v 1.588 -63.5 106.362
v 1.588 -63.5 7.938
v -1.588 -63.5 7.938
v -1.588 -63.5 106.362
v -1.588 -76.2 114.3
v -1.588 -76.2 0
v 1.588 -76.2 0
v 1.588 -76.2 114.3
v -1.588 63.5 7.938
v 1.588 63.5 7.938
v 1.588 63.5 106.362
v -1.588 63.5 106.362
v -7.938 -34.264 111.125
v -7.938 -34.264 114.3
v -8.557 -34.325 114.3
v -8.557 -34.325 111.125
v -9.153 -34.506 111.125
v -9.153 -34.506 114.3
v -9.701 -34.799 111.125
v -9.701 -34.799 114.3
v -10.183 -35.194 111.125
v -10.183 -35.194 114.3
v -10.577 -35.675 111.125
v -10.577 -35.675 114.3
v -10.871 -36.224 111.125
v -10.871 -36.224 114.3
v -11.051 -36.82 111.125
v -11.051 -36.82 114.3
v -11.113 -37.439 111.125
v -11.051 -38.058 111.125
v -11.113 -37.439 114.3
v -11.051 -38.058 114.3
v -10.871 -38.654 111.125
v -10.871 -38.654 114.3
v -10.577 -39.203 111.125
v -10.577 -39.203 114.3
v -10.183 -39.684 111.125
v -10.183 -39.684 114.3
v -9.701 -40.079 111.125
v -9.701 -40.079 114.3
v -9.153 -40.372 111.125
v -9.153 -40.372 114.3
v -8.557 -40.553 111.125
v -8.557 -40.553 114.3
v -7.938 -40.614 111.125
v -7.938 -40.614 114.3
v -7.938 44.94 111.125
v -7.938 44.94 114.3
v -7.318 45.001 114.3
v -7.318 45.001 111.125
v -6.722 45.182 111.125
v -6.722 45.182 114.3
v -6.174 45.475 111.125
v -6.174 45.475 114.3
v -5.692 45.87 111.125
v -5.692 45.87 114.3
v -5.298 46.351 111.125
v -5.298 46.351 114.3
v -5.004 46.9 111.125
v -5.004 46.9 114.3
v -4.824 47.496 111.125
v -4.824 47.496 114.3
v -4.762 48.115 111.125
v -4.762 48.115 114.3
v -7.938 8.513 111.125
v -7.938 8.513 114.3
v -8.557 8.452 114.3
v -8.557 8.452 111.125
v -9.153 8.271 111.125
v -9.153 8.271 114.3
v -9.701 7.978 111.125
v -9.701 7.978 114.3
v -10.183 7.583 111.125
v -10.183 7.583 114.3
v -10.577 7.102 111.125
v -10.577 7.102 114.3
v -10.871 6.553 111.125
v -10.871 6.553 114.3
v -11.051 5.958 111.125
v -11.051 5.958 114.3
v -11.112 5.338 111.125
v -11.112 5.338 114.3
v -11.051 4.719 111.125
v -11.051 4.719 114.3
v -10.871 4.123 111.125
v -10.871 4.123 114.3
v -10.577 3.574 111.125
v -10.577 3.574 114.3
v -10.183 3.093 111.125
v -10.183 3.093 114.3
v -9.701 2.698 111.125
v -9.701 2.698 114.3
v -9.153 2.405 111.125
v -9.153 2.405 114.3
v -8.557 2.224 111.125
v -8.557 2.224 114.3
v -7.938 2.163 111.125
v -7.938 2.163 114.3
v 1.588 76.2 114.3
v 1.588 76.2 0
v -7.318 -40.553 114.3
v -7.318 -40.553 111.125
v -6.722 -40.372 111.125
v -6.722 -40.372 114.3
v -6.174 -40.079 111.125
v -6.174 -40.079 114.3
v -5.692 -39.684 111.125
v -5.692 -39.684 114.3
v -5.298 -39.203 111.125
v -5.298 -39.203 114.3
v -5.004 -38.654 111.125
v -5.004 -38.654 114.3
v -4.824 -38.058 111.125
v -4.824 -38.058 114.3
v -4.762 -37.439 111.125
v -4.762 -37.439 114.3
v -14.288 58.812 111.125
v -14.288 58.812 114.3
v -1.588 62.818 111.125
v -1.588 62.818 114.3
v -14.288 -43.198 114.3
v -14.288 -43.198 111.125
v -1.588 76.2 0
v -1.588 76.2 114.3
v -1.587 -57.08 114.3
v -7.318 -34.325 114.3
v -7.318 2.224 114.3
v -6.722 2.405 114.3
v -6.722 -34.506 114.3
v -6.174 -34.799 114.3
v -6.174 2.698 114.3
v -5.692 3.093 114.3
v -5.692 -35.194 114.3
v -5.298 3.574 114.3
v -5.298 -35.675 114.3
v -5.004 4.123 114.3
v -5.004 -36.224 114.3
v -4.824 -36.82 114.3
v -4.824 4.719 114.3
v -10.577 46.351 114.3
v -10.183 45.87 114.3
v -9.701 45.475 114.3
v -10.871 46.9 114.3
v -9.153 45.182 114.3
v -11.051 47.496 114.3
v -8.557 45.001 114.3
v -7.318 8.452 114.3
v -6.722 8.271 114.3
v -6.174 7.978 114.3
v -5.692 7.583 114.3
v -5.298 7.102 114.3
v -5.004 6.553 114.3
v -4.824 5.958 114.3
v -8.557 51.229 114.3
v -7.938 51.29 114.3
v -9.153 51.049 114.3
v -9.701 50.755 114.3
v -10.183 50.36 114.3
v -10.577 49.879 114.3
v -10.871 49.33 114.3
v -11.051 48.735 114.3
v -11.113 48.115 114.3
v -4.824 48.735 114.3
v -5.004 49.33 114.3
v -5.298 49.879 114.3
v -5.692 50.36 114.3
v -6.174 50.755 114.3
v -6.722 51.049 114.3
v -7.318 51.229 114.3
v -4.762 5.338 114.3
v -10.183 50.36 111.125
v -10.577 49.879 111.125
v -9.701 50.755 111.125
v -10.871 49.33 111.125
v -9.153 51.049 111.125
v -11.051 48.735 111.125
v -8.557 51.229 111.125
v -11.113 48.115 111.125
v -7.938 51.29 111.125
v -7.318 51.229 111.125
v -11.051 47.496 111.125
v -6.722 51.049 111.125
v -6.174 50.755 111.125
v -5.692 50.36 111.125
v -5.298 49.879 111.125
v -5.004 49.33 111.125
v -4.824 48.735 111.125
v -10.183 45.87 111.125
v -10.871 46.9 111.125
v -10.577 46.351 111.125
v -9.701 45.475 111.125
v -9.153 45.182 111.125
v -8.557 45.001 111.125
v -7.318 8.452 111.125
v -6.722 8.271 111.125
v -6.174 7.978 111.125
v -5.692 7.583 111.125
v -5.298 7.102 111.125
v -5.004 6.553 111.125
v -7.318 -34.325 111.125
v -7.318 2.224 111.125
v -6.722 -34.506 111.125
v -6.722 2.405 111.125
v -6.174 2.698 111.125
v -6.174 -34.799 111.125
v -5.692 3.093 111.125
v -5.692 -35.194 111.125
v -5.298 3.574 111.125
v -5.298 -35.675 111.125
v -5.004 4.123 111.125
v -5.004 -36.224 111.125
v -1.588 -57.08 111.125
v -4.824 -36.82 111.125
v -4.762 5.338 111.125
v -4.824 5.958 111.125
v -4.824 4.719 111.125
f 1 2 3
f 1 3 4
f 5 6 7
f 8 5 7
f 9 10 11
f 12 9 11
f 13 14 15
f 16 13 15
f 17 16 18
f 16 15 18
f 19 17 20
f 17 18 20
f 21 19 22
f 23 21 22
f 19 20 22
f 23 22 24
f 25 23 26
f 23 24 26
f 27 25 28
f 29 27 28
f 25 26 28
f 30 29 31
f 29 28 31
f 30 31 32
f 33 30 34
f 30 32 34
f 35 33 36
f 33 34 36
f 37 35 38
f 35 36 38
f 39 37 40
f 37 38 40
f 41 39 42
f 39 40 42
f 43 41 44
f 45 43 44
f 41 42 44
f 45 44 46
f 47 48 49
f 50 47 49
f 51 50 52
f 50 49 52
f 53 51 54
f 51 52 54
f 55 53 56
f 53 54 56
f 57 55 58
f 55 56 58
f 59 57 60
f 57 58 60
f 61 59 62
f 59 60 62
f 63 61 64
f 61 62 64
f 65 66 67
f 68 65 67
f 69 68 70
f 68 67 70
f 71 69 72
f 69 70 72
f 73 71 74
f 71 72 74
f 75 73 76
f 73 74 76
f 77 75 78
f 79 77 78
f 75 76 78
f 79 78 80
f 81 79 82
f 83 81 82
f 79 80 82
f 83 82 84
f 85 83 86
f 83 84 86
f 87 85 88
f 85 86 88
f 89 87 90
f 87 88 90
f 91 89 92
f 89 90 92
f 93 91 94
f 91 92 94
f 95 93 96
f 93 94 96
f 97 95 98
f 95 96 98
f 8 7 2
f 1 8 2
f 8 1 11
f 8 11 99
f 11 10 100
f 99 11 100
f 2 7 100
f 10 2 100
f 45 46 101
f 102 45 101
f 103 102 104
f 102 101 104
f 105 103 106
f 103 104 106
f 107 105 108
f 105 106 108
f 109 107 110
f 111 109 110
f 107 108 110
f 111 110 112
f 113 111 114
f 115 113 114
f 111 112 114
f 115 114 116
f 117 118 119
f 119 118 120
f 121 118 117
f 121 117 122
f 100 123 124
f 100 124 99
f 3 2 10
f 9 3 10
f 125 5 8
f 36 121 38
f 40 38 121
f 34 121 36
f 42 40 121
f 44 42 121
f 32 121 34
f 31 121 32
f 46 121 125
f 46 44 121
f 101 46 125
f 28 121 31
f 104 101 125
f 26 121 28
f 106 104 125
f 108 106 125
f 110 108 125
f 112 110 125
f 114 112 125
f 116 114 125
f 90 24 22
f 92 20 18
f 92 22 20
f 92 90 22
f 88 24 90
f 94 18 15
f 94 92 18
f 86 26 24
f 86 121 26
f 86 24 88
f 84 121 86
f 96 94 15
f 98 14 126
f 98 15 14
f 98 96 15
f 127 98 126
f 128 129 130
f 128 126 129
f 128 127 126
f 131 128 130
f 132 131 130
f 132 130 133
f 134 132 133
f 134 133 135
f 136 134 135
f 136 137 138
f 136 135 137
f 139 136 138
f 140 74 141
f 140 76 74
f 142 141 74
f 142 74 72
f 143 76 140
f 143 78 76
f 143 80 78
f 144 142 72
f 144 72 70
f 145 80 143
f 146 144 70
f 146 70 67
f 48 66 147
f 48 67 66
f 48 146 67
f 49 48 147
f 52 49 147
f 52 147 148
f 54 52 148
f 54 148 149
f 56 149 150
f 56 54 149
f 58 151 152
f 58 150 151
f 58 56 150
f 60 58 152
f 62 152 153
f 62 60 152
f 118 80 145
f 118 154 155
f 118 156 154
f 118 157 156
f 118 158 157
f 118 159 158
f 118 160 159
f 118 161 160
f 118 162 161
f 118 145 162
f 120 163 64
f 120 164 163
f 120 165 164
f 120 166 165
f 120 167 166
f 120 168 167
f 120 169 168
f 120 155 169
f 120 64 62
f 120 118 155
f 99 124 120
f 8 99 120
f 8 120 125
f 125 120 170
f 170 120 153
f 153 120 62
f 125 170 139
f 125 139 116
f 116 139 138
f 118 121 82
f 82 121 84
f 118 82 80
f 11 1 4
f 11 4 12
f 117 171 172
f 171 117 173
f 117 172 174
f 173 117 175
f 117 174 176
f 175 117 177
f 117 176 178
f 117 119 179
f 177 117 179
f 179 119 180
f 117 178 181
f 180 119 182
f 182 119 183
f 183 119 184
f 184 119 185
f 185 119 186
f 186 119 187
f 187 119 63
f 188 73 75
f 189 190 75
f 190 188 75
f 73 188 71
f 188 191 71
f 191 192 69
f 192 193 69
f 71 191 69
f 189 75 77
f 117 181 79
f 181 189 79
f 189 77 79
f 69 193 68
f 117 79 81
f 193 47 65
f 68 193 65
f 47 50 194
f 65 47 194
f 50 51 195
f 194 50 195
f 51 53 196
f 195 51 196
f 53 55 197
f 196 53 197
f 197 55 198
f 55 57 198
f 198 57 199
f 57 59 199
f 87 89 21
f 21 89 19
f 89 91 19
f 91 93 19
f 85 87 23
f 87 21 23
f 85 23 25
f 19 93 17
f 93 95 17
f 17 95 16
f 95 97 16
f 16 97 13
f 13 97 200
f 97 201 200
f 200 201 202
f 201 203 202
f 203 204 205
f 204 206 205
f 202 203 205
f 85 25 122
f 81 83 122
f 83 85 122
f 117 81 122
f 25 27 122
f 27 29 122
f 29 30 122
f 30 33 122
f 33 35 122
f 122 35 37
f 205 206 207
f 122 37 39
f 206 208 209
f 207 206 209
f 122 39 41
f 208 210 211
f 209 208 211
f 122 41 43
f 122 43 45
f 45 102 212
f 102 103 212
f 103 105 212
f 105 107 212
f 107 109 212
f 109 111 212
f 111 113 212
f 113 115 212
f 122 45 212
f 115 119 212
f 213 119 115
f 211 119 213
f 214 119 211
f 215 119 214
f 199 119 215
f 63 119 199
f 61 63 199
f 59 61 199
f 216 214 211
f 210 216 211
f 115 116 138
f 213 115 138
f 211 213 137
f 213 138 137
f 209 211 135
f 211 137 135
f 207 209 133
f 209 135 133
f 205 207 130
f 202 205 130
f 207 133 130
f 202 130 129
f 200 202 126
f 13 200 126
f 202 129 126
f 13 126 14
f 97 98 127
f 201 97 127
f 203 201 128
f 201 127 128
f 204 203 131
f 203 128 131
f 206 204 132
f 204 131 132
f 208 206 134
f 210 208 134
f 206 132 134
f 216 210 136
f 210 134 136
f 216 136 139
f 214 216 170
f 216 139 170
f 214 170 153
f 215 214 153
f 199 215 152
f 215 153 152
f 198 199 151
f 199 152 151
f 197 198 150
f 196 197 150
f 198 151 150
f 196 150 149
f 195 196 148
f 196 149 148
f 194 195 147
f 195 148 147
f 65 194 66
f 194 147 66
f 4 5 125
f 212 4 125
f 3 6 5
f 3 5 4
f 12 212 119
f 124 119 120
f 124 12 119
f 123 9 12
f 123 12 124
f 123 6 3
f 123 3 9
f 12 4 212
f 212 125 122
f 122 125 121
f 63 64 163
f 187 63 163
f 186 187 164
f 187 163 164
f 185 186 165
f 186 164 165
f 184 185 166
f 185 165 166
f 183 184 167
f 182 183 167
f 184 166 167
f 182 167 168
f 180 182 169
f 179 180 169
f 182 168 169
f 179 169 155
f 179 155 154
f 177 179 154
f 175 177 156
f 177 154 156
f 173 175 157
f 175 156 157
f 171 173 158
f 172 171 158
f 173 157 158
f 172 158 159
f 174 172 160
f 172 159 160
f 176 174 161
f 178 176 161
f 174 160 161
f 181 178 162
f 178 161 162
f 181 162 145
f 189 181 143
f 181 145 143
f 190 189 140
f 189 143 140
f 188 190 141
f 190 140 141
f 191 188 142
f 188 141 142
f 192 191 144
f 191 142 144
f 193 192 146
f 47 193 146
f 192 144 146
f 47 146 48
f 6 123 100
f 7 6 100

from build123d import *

# Parameters (mm, degrees)
F0_W     = 3.175
F0_H     = 152.4
F1_DEPTH = 114.3
F2_W     = 127
F2_H     = 98.425
F3_DEPTH = 25.4
F4_W     = 119.8984608054
F4_H     = 3.175
F5_DEPTH = 12.7
F7_DEPTH = 25.4
F9_DEPTH = 25.4


with BuildPart() as f1:
    # F0 (on Top) → F1 (new body)
    with BuildSketch(Plane.XY):
        Rectangle(F0_W, F0_H)
    extrude(amount=F1_DEPTH)

    # F2 (on face) → F3 (cut)
    with BuildSketch(Plane.YZ.offset(1.5875)):
        with Locations((0, 57.15)):
            Rectangle(F2_W, F2_H)
    extrude(amount=-F3_DEPTH, mode=Mode.SUBTRACT)

    # F4 (on face) → F5 (join)
    with BuildSketch(Plane(origin=(-1.5875, 0, 0), x_dir=(0, -1, 0), z_dir=(-1, 0, 0))):
        with Locations((-2.8692372143, 112.7125)):
            Rectangle(F4_W, F4_H)
    extrude(amount=F5_DEPTH)

    # F6 (on face) → F7 (cut)
    with BuildSketch(Plane.XY.offset(114.3)):
        Polygon((-14.2875, 58.8119849563), (-1.5875, 62.818467617), (-14.2875, 62.818467617), align=None)
        Polygon((-14.2875, -57.0799931884), (-1.5875, -57.0799931884), (-14.2875, -43.1980900466), align=None)
    extrude(amount=-F7_DEPTH, mode=Mode.SUBTRACT)

    # F8 (on face) → F9 (cut)
    with BuildSketch(Plane.XY.offset(114.3)):
        with BuildLine():
            ThreePointArc((-4.7625, 48.1152262866), (-5.6924359697, 50.3602903169), (-7.9375, 51.2902262866))
            Line((-7.9375, 51.2902262866), (-7.9375, 44.9402262866))
            ThreePointArc((-7.9375, 44.9402262866), (-5.6924359697, 45.8701622564), (-4.7625, 48.1152262866))
        make_face()
        with BuildLine():
            ThreePointArc((-4.7625, -37.4390416175), (-5.6924359697, -35.1939775872), (-7.9375, -34.2640416175))
            Line((-7.9375, -34.2640416175), (-7.9375, -40.6140416175))
            ThreePointArc((-7.9375, -40.6140416175), (-5.6924359697, -39.6841056478), (-4.7625, -37.4390416175))
        make_face()
        with BuildLine():
            Line((-7.9375, -40.6140416175), (-7.9375, -34.2640416175))
            ThreePointArc((-7.9375, -34.2640416175), (-11.1125, -37.4390416175), (-7.9375, -40.6140416175))
        make_face()
        with BuildLine():
            ThreePointArc((-4.7625, 5.3380923346), (-5.6924359697, 7.5831563648), (-7.9375, 8.5130923346))
            Line((-7.9375, 8.5130923346), (-7.9375, 2.1630923346))
            ThreePointArc((-7.9375, 2.1630923346), (-5.6924359697, 3.0930283043), (-4.7625, 5.3380923346))
        make_face()
        with BuildLine():
            Line((-7.9375, 2.1630923346), (-7.9375, 8.5130923346))
            ThreePointArc((-7.9375, 8.5130923346), (-11.1125, 5.3380923346), (-7.9375, 2.1630923346))
        make_face()
        with BuildLine():
            Line((-7.9375, 44.9402262866), (-7.9375, 51.2902262866))
            ThreePointArc((-7.9375, 51.2902262866), (-11.1125, 48.1152262866), (-7.9375, 44.9402262866))
        make_face()
    extrude(amount=-F9_DEPTH, mode=Mode.SUBTRACT)


solid = f1.part
